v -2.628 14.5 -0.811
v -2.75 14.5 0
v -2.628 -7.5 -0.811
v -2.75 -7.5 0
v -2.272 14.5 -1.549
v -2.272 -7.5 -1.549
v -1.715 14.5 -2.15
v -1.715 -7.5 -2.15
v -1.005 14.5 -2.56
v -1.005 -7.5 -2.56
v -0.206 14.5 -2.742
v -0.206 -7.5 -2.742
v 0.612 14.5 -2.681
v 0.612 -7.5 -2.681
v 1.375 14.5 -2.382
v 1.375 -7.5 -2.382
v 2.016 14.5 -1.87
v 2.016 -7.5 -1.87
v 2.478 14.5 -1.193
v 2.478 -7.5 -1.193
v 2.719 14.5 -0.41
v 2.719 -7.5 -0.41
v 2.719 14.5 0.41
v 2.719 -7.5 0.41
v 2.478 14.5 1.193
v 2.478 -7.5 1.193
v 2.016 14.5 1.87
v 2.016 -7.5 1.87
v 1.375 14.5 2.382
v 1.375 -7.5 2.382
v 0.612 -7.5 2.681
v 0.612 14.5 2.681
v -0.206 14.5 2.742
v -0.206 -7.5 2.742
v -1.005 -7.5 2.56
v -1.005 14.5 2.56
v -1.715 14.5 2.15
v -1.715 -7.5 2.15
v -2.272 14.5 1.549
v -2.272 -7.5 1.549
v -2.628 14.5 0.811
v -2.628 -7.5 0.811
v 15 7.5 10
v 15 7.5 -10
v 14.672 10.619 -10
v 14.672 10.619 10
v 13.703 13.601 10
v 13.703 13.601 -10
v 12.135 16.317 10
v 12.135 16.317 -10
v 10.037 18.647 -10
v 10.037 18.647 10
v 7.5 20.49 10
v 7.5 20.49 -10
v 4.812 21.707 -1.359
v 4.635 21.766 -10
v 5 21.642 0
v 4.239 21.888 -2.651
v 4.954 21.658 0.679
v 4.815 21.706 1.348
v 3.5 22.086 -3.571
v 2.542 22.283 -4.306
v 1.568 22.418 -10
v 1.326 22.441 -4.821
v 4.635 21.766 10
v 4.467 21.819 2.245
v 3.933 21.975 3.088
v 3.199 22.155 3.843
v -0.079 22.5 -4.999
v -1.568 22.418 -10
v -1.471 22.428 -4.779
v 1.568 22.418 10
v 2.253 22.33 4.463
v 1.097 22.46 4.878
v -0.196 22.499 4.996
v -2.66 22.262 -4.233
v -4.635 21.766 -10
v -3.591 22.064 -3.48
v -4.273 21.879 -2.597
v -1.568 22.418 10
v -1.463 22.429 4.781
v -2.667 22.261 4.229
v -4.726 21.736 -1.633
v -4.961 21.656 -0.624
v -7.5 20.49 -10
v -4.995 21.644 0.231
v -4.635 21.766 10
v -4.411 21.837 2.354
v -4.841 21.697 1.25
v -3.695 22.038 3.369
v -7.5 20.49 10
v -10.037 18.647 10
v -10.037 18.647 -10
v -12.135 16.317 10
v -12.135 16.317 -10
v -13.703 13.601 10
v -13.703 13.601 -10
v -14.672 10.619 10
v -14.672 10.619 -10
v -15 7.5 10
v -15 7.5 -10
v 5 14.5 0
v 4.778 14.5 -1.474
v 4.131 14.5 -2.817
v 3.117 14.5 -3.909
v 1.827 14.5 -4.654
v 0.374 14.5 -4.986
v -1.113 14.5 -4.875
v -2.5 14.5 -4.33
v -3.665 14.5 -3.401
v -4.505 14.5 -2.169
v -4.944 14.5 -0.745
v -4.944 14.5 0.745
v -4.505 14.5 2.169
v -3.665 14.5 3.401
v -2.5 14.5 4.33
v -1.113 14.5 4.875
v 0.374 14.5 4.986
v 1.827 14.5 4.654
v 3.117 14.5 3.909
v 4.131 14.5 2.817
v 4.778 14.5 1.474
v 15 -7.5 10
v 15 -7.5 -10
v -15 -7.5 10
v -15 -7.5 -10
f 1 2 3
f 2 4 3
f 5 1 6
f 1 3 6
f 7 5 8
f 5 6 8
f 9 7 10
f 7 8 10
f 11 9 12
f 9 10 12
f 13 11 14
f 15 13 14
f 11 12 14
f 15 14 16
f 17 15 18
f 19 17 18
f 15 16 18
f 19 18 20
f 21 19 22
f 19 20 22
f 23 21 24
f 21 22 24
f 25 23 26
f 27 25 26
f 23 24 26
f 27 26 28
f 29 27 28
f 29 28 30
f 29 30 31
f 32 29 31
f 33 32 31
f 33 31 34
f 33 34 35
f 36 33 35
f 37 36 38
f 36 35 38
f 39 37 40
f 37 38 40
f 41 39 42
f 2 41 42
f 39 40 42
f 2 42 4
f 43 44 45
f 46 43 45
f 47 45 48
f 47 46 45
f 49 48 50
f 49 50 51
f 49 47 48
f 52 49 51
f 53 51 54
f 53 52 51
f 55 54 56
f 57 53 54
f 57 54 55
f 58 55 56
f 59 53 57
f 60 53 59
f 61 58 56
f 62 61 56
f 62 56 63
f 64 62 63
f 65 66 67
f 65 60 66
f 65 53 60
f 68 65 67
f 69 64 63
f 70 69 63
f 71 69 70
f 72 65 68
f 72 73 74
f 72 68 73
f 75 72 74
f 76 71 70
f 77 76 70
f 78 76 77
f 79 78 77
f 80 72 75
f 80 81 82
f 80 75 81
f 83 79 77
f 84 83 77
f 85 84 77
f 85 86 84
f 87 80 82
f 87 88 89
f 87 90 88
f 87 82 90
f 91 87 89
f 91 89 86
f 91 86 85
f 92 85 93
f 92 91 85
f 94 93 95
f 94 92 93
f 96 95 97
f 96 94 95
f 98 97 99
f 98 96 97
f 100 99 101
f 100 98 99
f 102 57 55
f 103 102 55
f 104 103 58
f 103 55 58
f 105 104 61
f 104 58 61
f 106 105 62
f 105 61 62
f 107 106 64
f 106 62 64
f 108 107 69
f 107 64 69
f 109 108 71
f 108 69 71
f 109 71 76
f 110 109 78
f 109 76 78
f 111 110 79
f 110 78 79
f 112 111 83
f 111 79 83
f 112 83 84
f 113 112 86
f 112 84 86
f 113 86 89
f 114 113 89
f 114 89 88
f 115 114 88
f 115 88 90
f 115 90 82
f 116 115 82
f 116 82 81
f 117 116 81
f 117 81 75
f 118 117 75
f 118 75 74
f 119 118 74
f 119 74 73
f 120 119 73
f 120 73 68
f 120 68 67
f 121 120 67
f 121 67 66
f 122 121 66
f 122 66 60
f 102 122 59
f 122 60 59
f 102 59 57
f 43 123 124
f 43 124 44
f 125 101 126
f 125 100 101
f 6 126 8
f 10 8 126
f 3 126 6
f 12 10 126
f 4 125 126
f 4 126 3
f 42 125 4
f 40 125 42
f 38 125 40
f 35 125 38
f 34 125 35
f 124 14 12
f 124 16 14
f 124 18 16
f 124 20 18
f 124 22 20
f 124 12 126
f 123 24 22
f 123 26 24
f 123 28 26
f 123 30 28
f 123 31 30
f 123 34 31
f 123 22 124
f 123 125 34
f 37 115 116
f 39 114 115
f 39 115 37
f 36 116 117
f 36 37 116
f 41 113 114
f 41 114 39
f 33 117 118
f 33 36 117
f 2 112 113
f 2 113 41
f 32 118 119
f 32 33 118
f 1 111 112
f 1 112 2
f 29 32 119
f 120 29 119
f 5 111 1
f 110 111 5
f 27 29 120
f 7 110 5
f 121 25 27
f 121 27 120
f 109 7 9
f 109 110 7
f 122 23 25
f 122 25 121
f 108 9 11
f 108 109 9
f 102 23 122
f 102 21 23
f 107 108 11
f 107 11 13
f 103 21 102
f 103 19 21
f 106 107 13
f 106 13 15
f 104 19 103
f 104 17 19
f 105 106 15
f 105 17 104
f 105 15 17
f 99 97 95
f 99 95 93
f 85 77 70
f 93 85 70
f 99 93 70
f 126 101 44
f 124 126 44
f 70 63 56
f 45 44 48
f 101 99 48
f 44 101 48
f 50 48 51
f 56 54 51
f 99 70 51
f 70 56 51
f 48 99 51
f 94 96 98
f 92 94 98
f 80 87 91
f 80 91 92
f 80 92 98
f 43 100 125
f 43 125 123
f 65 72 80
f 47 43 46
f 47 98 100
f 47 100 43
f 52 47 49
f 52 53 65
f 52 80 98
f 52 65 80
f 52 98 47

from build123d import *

# Parameters (mm, degrees)
BOSS_EXTRUDE1_DEPTH                                 = 10
CBORE_FOR_M5_HEX_SOCKET_HEAD_CAP_SCREW1_D           = 5.5
CBORE_FOR_M5_HEX_SOCKET_HEAD_CAP_SCREW1_CBORE_D     = 10
CBORE_FOR_M5_HEX_SOCKET_HEAD_CAP_SCREW1_CBORE_DEPTH = 8


with BuildPart() as part:
    # Sketch1 → Boss-Extrude1 (new, symmetric)
    with BuildSketch(Plane.XY):
        with BuildLine():
            Line((-15, 7.5), (-15, -7.5))
            Line((-15, -7.5), (15, -7.5))
            Line((15, -7.5), (15, 7.5))
            ThreePointArc((15, 7.5), (0, 22.5), (-15, 7.5))
        make_face()
    extrude(amount=BOSS_EXTRUDE1_DEPTH, both=True)

    # CBORE for M5 Hex Socket Head Cap Screw1 (through all)
    with Locations(Plane(origin=(0, 22.5, 0), x_dir=(1, 0, 0), z_dir=(0, 1, 0))):
        with Locations((0, 0)):
            CounterBoreHole(CBORE_FOR_M5_HEX_SOCKET_HEAD_CAP_SCREW1_D / 2, CBORE_FOR_M5_HEX_SOCKET_HEAD_CAP_SCREW1_CBORE_D / 2, CBORE_FOR_M5_HEX_SOCKET_HEAD_CAP_SCREW1_CBORE_DEPTH)


solid = part.part
